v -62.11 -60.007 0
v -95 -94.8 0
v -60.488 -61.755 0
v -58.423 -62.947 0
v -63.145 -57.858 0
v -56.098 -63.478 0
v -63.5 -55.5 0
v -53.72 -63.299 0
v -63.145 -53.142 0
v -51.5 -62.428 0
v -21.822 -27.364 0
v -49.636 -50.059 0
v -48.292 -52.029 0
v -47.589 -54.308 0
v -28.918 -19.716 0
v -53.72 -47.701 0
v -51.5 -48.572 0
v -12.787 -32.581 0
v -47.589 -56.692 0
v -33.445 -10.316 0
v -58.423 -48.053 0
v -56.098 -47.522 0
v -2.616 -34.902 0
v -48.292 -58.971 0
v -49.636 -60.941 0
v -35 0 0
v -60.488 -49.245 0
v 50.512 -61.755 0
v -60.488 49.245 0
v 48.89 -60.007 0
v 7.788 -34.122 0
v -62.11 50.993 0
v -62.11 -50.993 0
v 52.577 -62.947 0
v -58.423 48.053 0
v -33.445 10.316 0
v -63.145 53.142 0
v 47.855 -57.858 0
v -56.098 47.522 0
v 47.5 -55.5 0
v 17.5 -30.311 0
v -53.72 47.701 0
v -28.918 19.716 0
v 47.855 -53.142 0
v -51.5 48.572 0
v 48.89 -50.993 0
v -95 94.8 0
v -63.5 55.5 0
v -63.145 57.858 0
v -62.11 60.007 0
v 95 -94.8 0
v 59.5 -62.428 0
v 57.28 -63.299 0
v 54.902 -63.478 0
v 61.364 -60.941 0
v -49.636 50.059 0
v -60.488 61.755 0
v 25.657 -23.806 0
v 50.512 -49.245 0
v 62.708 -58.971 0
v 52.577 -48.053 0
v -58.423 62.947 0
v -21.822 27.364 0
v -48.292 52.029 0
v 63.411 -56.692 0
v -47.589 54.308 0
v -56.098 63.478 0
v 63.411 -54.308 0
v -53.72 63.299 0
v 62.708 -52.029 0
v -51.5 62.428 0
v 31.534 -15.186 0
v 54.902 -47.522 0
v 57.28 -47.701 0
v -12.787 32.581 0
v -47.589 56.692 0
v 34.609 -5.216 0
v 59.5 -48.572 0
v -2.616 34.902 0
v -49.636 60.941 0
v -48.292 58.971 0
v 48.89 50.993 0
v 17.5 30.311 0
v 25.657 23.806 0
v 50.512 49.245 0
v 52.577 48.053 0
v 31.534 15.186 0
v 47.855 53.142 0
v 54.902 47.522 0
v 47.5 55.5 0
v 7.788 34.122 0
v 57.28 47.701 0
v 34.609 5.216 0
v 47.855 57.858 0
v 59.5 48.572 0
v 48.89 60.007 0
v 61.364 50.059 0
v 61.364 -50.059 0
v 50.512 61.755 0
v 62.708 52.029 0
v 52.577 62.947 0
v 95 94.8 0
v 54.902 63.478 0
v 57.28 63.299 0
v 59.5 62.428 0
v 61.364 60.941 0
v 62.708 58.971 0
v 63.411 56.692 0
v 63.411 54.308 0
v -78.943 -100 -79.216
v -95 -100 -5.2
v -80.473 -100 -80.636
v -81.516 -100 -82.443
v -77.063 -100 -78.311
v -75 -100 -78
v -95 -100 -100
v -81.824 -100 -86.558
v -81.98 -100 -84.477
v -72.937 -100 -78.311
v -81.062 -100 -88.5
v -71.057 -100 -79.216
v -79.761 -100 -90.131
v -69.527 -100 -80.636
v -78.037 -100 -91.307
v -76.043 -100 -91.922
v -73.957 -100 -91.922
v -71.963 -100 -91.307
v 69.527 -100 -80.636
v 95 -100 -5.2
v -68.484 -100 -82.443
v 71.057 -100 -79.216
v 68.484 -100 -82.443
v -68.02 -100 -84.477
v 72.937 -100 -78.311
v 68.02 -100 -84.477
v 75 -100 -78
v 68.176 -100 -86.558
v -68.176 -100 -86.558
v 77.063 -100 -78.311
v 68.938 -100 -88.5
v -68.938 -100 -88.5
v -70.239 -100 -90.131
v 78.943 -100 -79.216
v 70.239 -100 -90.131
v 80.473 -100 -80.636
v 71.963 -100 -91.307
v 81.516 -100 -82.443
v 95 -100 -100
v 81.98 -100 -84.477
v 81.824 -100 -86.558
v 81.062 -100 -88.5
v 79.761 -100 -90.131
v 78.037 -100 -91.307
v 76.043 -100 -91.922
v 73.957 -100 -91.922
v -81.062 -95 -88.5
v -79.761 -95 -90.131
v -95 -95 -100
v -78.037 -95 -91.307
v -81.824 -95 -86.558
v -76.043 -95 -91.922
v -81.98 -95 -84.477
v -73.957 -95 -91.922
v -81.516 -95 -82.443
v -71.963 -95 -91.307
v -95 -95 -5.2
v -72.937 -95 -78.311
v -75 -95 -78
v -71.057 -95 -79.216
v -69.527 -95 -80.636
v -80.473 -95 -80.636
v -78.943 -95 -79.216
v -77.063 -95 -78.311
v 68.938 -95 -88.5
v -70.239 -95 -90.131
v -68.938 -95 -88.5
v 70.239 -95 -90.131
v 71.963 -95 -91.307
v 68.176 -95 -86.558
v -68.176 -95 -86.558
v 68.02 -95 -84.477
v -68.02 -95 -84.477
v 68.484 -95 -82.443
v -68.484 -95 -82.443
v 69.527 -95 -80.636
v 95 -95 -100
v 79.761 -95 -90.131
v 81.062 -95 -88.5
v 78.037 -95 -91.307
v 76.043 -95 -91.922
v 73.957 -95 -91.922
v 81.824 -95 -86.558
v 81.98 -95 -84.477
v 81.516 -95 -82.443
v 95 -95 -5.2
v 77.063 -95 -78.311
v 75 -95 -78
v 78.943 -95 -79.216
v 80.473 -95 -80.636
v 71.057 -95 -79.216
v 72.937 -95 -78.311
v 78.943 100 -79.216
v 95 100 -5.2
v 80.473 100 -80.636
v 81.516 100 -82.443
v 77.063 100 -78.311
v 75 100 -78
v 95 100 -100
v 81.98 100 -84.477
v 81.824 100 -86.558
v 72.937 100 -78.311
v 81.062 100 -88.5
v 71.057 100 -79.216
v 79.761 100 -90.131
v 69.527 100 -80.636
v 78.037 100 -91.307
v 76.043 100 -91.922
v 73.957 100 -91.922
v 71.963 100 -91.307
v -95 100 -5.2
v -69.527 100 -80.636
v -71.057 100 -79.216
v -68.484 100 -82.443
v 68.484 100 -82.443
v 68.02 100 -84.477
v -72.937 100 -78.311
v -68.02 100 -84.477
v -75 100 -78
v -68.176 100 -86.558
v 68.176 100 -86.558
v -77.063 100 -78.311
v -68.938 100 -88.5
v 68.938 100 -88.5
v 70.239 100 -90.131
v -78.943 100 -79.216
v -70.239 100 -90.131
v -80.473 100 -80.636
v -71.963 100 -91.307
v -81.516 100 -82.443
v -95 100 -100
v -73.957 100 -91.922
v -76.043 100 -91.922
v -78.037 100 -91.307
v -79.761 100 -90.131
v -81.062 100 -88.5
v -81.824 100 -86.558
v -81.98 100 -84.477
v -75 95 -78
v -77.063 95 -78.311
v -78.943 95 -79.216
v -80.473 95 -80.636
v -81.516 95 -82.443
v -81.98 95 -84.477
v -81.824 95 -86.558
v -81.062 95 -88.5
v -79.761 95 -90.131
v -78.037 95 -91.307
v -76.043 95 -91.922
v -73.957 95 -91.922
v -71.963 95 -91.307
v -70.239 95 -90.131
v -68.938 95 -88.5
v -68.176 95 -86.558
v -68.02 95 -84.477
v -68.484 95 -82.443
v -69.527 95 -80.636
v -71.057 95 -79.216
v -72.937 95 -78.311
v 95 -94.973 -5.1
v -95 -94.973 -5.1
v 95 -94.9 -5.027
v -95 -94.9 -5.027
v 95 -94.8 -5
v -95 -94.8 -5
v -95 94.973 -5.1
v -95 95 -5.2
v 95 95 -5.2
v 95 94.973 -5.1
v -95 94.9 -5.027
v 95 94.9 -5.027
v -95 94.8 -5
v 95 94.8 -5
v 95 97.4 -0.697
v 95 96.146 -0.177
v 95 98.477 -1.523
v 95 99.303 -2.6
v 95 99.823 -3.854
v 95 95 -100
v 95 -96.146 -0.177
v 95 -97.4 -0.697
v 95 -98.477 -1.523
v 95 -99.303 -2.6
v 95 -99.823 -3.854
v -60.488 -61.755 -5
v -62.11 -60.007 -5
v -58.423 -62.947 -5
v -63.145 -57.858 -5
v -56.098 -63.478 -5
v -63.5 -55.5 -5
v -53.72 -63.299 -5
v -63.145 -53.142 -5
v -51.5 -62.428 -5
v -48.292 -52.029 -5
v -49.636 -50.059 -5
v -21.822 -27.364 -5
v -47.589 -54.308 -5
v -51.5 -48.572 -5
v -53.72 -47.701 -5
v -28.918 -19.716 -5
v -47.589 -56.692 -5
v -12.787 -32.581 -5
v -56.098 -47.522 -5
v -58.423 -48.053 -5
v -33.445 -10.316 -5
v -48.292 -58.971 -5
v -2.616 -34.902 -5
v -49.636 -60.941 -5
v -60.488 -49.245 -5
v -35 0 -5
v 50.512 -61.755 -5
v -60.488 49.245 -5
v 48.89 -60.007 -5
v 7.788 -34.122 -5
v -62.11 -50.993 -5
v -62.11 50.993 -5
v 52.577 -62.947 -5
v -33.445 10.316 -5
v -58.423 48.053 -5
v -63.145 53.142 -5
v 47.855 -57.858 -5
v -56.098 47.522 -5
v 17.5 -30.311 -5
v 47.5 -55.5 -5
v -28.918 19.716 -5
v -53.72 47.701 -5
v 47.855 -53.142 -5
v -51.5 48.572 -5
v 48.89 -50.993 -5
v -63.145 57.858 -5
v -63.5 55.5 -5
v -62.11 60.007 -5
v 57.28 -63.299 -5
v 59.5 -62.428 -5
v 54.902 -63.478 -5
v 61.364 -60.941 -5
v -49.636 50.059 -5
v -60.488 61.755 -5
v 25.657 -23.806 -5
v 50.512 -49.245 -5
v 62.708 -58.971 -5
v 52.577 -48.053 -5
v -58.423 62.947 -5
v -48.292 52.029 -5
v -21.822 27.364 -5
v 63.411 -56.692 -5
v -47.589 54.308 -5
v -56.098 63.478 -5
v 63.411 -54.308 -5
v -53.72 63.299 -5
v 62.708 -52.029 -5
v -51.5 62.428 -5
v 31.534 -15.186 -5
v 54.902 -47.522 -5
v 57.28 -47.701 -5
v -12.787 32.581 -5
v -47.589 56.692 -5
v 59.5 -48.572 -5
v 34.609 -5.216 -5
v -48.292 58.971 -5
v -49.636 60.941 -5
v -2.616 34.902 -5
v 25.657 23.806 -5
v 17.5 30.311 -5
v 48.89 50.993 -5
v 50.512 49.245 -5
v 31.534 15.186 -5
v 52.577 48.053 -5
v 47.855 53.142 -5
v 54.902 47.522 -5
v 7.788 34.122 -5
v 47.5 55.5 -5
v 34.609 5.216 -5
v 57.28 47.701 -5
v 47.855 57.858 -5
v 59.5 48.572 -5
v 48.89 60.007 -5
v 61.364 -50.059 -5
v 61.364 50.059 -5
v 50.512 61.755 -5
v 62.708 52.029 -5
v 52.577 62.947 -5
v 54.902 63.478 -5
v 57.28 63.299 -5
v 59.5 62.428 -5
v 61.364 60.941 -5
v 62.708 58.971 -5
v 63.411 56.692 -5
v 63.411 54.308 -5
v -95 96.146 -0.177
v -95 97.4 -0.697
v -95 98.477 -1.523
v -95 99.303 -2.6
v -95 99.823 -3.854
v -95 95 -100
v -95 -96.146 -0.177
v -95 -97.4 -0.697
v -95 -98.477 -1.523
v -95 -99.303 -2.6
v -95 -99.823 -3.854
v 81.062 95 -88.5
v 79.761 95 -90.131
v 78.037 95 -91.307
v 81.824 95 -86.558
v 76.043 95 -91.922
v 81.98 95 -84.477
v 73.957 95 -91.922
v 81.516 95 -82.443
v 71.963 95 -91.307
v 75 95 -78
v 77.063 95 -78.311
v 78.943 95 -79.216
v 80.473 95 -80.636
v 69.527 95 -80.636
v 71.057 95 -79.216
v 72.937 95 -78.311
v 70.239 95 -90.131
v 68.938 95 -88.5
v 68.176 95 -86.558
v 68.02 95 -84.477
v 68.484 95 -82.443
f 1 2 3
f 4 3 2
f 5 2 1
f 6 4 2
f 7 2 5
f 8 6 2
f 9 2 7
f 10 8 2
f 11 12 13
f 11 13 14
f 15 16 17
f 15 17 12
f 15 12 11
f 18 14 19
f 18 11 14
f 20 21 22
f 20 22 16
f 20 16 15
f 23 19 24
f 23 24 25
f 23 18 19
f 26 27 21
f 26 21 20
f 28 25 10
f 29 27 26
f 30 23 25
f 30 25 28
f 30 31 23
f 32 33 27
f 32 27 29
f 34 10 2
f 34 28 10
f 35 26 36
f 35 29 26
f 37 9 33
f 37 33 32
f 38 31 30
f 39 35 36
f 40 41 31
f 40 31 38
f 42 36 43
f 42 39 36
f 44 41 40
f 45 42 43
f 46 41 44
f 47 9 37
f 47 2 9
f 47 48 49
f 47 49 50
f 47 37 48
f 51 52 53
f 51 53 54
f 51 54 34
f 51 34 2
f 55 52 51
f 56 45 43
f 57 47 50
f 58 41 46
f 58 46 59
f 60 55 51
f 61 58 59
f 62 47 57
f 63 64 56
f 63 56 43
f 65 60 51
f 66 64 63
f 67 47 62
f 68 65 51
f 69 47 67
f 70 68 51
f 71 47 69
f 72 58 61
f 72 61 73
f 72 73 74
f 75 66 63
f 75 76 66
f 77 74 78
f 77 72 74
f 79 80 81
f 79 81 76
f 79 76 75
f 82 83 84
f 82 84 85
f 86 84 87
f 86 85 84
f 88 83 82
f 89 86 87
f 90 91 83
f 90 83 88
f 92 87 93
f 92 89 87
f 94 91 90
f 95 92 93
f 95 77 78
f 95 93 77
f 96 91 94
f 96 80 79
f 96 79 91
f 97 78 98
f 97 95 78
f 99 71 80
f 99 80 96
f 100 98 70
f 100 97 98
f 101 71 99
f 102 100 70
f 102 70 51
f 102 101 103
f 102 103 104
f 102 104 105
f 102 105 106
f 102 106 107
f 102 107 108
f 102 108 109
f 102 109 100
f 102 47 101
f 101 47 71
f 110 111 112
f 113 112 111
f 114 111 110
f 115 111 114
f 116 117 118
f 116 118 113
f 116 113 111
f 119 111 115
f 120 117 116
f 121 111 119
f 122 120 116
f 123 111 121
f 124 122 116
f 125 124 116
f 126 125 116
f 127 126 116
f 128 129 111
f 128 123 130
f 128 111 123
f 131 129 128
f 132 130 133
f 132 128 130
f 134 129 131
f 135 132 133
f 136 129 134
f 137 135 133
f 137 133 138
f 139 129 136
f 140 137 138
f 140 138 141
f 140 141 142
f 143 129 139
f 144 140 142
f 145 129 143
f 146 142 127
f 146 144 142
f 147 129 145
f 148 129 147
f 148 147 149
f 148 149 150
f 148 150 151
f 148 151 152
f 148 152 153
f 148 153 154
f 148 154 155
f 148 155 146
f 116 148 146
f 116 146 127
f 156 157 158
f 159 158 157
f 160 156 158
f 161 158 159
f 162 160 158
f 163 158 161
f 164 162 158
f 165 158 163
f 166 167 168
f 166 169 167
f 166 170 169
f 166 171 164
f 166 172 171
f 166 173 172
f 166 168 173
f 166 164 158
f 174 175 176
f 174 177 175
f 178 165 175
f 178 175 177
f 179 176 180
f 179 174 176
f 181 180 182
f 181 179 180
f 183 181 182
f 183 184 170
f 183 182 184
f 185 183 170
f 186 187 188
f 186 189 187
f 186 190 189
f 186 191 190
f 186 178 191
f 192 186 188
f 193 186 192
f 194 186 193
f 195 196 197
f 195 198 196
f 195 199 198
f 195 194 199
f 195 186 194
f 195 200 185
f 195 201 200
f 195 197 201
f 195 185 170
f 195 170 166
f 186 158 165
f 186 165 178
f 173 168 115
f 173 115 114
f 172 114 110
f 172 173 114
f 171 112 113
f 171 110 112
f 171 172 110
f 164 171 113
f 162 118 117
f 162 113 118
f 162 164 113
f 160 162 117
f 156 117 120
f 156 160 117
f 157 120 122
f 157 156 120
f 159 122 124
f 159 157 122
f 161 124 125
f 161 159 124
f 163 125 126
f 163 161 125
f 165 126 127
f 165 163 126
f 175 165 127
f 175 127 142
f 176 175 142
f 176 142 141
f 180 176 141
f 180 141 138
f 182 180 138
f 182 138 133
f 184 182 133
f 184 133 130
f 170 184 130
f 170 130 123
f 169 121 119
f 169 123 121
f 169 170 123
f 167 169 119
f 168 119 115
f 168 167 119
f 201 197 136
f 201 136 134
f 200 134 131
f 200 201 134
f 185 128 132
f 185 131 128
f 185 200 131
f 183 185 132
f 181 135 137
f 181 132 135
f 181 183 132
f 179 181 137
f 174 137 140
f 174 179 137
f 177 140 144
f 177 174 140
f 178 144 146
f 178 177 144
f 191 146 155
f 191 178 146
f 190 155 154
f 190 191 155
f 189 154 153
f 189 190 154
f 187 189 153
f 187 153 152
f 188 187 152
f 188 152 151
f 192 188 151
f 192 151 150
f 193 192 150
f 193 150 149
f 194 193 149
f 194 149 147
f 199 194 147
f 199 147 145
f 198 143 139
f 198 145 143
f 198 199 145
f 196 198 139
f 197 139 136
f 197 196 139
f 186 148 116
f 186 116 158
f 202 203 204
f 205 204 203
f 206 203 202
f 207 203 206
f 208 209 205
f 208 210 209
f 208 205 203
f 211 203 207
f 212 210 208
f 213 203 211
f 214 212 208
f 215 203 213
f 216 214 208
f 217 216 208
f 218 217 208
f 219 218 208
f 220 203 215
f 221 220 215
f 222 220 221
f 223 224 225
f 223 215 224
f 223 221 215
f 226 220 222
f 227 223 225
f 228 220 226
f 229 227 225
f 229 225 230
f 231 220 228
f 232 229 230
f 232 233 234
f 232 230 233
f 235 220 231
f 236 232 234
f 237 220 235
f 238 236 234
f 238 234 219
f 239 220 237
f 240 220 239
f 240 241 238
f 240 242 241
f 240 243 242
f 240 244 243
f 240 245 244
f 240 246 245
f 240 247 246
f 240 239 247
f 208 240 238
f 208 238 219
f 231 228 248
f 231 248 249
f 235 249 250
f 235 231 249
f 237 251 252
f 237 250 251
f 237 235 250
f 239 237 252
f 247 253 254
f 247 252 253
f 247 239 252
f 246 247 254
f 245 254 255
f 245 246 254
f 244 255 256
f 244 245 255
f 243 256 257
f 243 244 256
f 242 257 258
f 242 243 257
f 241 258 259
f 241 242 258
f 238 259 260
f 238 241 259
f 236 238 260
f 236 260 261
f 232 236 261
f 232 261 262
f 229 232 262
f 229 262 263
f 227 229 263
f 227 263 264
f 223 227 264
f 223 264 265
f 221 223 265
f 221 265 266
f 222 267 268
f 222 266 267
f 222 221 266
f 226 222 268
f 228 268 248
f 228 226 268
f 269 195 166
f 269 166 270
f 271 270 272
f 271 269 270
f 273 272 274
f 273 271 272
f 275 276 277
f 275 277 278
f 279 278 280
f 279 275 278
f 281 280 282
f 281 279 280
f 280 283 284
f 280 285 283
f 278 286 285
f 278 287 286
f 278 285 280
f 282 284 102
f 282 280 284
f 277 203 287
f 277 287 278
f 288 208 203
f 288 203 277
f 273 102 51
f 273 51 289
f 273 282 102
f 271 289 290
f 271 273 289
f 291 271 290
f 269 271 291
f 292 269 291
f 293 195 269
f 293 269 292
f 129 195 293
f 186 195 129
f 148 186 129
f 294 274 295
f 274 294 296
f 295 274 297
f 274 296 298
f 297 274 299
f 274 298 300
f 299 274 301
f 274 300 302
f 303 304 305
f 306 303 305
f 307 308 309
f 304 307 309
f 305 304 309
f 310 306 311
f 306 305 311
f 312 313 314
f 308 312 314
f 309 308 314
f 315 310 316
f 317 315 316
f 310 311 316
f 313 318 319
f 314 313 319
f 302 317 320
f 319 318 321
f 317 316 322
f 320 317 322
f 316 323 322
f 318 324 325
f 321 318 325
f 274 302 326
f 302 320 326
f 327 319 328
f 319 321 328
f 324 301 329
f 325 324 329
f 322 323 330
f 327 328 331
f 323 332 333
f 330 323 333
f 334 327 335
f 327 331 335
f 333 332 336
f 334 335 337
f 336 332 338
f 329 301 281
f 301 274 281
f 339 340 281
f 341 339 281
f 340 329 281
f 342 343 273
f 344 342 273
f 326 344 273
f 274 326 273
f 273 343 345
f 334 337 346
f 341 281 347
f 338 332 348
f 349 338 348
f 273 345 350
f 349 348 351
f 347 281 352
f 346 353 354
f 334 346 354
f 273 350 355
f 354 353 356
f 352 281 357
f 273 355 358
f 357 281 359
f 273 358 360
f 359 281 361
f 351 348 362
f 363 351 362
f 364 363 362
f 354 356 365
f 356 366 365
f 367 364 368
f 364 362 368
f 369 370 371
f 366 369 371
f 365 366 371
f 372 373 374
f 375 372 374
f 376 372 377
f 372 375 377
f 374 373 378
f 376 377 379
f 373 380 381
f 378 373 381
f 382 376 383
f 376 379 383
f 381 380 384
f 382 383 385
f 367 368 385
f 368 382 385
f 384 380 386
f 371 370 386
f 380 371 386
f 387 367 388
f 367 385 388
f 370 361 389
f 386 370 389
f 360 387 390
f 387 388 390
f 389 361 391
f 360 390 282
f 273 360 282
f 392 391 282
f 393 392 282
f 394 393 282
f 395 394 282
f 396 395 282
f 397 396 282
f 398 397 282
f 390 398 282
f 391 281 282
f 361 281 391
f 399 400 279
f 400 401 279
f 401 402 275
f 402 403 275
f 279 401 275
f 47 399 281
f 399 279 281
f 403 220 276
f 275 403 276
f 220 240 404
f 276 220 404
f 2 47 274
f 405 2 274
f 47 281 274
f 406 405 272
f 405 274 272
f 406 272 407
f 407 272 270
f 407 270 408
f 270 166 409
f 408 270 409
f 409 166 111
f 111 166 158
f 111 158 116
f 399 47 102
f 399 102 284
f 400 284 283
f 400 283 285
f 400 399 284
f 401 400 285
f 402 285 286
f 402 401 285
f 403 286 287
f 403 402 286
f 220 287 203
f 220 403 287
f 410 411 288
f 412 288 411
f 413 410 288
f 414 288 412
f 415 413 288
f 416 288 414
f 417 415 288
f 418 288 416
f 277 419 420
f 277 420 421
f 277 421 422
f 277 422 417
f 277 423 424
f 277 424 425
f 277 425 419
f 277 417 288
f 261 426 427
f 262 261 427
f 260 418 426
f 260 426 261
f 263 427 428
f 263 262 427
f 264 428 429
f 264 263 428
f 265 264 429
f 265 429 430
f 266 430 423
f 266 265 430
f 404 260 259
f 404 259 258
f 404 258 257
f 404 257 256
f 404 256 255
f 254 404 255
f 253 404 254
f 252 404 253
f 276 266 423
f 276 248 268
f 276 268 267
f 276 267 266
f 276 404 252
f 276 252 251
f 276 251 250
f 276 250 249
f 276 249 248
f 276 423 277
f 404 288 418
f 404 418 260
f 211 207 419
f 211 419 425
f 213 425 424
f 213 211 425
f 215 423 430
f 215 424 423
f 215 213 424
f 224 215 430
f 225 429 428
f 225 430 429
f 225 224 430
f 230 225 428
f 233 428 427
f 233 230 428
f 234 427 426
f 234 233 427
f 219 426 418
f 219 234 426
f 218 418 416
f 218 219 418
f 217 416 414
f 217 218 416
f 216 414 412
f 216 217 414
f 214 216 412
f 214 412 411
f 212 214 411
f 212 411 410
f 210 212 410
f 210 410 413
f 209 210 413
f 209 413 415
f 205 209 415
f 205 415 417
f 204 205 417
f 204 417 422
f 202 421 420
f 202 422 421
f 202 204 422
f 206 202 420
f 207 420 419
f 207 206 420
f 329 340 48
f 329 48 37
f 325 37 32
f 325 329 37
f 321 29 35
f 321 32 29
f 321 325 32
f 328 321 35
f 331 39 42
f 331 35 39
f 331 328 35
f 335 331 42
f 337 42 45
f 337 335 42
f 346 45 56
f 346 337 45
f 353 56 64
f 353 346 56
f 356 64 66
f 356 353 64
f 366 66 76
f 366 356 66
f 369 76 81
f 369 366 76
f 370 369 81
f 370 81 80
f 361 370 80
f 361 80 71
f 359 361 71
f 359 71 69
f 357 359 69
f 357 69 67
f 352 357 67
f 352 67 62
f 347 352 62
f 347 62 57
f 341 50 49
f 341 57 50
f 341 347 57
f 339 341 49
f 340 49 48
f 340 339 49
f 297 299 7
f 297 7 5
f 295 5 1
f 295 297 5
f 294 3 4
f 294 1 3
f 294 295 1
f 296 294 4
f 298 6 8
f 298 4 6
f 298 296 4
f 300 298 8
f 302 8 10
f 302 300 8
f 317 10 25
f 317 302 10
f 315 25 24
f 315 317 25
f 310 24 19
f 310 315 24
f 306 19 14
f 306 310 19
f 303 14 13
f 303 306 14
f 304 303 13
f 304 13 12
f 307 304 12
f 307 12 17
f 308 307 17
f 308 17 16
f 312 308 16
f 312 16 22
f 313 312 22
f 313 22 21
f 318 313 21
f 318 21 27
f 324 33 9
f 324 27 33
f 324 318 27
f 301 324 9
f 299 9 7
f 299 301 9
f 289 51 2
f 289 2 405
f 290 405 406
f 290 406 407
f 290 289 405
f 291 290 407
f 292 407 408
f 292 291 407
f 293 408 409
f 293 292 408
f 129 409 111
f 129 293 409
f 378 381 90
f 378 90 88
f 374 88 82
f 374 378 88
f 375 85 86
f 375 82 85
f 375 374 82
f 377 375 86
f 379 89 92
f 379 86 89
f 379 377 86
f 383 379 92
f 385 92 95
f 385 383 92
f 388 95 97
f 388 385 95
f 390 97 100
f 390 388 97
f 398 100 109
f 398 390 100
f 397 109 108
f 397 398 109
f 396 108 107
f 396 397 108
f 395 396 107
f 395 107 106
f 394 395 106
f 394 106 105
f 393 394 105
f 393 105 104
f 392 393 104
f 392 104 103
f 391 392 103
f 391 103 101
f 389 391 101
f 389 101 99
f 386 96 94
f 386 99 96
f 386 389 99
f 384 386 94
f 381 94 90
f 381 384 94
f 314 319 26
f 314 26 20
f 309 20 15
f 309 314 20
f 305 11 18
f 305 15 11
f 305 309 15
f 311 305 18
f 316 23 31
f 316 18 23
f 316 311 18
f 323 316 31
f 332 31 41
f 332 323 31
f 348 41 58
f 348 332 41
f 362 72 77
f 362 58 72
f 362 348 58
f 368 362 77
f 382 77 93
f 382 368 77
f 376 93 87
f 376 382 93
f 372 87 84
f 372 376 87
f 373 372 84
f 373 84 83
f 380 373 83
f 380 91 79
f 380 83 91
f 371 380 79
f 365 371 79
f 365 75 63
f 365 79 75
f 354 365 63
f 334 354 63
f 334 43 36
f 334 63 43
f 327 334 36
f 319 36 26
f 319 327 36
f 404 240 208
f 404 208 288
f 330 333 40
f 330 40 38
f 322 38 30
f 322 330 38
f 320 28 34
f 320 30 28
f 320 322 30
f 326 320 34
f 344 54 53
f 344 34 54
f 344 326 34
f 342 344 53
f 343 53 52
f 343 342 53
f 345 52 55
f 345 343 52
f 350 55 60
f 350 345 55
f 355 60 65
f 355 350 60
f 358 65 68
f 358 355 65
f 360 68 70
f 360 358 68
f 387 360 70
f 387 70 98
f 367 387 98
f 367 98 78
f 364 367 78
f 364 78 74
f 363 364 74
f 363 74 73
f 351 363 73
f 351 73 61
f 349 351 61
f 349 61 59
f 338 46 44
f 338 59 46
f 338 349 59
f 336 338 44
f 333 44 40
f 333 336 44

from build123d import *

# Parameters (mm, degrees)
SKETCH1_W                    = 190
SKETCH1_H                    = 200
BASE_FLANGE1_DEPTH           = 5
EDGE_FLANGE1_STRIP_W         = 20.4
EDGE_FLANGE1_STRIP_H         = 5
EDGE_FLANGE1_STRIP_CUT_DEPTH = 190
EDGE_FLANGE1_DEPTH           = 190
EDGE_FLANGE2_STRIP_W         = 20.4
EDGE_FLANGE2_STRIP_H         = 5
EDGE_FLANGE2_STRIP_CUT_DEPTH = 190
EDGE_FLANGE2_DEPTH           = 190
CUT_EXTRUDE1_DEPTH           = 171.367250374
CUT_EXTRUDE1_DEPTH_BACK      = 171.367250374
SKETCH12_R                   = 35
CUT_EXTRUDE2_DEPTH           = 171.367250374
CUT_EXTRUDE2_DEPTH_BACK      = 171.367250374
SKETCH13_R                   = 8
CUT_EXTRUDE3_DEPTH           = 243.950612265
CUT_EXTRUDE3_DEPTH_BACK      = 243.950612265
SKETCH14_R                   = 7


# Sheet-metal steps are written as plain solids
with BuildPart() as part:
    # Sketch1 → Base-Flange1 (new body)
    with BuildSketch(Plane.XY):
        Rectangle(SKETCH1_W, SKETCH1_H)
    extrude(amount=-BASE_FLANGE1_DEPTH)

    # Edge-Flange1 strip (across the edge) → Edge-Flange1 strip cut (cut)
    with BuildSketch(Plane(origin=(-95, 100, -5), x_dir=(0, -1, 0), z_dir=(1, 0, 0))):
        with Locations((-5, -2.5)):
            Rectangle(EDGE_FLANGE1_STRIP_W, EDGE_FLANGE1_STRIP_H)
    extrude(amount=EDGE_FLANGE1_STRIP_CUT_DEPTH, mode=Mode.SUBTRACT)

    # Edge-Flange1 section (across the edge) → Edge-Flange1 (add)
    with BuildSketch(Plane(origin=(-95, 100, -5), x_dir=(0, -1, 0), z_dir=(1, 0, 0))):
        with BuildLine():
            Line((0, 0.2), (0, 95))
            Line((0, 95), (5, 95))
            Line((5, 95), (5, 0.2))
            ThreePointArc((5, 0.2), (5.058578644, 0.058578644), (5.2, 0))
            Line((5.2, 0), (5.2, -5))
            ThreePointArc((5.2, -5), (1.523044738, -3.476955262), (0, 0.2))
        make_face()
    extrude(amount=EDGE_FLANGE1_DEPTH)

    # Edge-Flange2 strip (across the edge) → Edge-Flange2 strip cut (cut)
    with BuildSketch(Plane(origin=(95, -100, -5), x_dir=(0, 1, 0), z_dir=(-1, 0, 0))):
        with Locations((-5, -2.5)):
            Rectangle(EDGE_FLANGE2_STRIP_W, EDGE_FLANGE2_STRIP_H)
    extrude(amount=EDGE_FLANGE2_STRIP_CUT_DEPTH, mode=Mode.SUBTRACT)

    # Edge-Flange2 section (across the edge) → Edge-Flange2 (add)
    with BuildSketch(Plane(origin=(95, -100, -5), x_dir=(0, 1, 0), z_dir=(-1, 0, 0))):
        with BuildLine():
            Line((0, 0.2), (0, 95))
            Line((0, 95), (5, 95))
            Line((5, 95), (5, 0.2))
            ThreePointArc((5, 0.2), (5.058578644, 0.058578644), (5.2, 0))
            Line((5.2, 0), (5.2, -5))
            ThreePointArc((5.2, -5), (1.523044738, -3.476955262), (0, 0.2))
        make_face()
    extrude(amount=EDGE_FLANGE2_DEPTH)

    # Sketch12 → Cut-Extrude1 (cut, two sides: drawn at the far end of the back side and taken through both)
    with BuildSketch(Plane.XY.offset(-CUT_EXTRUDE1_DEPTH_BACK)):
        with Locations(Location((0, 0, 0), (0, 0, 180))):
            Circle(SKETCH12_R)
    extrude(amount=CUT_EXTRUDE1_DEPTH + CUT_EXTRUDE1_DEPTH_BACK, mode=Mode.SUBTRACT)

    # Sketch13 → Cut-Extrude2 (cut, two sides: drawn at the far end of the back side and taken through both)
    with BuildSketch(Plane.XY.offset(-CUT_EXTRUDE2_DEPTH_BACK)):
        with Locations(Location((55.5, 55.5, 0), (0, 0, 180))):
            Circle(SKETCH13_R)
        with Locations(Location((-55.5, 55.5, 0), (0, 0, 180))):
            Circle(SKETCH13_R)
        with Locations(Location((-55.5, -55.5, 0), (0, 0, 180))):
            Circle(SKETCH13_R)
        with Locations(Location((55.5, -55.5, 0), (0, 0, 180))):
            Circle(SKETCH13_R)
    extrude(amount=CUT_EXTRUDE2_DEPTH + CUT_EXTRUDE2_DEPTH_BACK, mode=Mode.SUBTRACT)

    # Sketch14 → Cut-Extrude3 (cut, two sides: drawn at the far end of the back side and taken through both)
    with BuildSketch(Plane(origin=(0, -100, 0), x_dir=(-1, 0, 0), z_dir=(0, -1, 0)).offset(-CUT_EXTRUDE3_DEPTH_BACK)):
        with Locations(Location((75, 85, 0), (0, 0, 270))):
            Circle(SKETCH14_R)
        with Locations(Location((-75, 85, 0), (0, 0, 270))):
            Circle(SKETCH14_R)
    extrude(amount=CUT_EXTRUDE3_DEPTH + CUT_EXTRUDE3_DEPTH_BACK, mode=Mode.SUBTRACT)


solid = part.part
